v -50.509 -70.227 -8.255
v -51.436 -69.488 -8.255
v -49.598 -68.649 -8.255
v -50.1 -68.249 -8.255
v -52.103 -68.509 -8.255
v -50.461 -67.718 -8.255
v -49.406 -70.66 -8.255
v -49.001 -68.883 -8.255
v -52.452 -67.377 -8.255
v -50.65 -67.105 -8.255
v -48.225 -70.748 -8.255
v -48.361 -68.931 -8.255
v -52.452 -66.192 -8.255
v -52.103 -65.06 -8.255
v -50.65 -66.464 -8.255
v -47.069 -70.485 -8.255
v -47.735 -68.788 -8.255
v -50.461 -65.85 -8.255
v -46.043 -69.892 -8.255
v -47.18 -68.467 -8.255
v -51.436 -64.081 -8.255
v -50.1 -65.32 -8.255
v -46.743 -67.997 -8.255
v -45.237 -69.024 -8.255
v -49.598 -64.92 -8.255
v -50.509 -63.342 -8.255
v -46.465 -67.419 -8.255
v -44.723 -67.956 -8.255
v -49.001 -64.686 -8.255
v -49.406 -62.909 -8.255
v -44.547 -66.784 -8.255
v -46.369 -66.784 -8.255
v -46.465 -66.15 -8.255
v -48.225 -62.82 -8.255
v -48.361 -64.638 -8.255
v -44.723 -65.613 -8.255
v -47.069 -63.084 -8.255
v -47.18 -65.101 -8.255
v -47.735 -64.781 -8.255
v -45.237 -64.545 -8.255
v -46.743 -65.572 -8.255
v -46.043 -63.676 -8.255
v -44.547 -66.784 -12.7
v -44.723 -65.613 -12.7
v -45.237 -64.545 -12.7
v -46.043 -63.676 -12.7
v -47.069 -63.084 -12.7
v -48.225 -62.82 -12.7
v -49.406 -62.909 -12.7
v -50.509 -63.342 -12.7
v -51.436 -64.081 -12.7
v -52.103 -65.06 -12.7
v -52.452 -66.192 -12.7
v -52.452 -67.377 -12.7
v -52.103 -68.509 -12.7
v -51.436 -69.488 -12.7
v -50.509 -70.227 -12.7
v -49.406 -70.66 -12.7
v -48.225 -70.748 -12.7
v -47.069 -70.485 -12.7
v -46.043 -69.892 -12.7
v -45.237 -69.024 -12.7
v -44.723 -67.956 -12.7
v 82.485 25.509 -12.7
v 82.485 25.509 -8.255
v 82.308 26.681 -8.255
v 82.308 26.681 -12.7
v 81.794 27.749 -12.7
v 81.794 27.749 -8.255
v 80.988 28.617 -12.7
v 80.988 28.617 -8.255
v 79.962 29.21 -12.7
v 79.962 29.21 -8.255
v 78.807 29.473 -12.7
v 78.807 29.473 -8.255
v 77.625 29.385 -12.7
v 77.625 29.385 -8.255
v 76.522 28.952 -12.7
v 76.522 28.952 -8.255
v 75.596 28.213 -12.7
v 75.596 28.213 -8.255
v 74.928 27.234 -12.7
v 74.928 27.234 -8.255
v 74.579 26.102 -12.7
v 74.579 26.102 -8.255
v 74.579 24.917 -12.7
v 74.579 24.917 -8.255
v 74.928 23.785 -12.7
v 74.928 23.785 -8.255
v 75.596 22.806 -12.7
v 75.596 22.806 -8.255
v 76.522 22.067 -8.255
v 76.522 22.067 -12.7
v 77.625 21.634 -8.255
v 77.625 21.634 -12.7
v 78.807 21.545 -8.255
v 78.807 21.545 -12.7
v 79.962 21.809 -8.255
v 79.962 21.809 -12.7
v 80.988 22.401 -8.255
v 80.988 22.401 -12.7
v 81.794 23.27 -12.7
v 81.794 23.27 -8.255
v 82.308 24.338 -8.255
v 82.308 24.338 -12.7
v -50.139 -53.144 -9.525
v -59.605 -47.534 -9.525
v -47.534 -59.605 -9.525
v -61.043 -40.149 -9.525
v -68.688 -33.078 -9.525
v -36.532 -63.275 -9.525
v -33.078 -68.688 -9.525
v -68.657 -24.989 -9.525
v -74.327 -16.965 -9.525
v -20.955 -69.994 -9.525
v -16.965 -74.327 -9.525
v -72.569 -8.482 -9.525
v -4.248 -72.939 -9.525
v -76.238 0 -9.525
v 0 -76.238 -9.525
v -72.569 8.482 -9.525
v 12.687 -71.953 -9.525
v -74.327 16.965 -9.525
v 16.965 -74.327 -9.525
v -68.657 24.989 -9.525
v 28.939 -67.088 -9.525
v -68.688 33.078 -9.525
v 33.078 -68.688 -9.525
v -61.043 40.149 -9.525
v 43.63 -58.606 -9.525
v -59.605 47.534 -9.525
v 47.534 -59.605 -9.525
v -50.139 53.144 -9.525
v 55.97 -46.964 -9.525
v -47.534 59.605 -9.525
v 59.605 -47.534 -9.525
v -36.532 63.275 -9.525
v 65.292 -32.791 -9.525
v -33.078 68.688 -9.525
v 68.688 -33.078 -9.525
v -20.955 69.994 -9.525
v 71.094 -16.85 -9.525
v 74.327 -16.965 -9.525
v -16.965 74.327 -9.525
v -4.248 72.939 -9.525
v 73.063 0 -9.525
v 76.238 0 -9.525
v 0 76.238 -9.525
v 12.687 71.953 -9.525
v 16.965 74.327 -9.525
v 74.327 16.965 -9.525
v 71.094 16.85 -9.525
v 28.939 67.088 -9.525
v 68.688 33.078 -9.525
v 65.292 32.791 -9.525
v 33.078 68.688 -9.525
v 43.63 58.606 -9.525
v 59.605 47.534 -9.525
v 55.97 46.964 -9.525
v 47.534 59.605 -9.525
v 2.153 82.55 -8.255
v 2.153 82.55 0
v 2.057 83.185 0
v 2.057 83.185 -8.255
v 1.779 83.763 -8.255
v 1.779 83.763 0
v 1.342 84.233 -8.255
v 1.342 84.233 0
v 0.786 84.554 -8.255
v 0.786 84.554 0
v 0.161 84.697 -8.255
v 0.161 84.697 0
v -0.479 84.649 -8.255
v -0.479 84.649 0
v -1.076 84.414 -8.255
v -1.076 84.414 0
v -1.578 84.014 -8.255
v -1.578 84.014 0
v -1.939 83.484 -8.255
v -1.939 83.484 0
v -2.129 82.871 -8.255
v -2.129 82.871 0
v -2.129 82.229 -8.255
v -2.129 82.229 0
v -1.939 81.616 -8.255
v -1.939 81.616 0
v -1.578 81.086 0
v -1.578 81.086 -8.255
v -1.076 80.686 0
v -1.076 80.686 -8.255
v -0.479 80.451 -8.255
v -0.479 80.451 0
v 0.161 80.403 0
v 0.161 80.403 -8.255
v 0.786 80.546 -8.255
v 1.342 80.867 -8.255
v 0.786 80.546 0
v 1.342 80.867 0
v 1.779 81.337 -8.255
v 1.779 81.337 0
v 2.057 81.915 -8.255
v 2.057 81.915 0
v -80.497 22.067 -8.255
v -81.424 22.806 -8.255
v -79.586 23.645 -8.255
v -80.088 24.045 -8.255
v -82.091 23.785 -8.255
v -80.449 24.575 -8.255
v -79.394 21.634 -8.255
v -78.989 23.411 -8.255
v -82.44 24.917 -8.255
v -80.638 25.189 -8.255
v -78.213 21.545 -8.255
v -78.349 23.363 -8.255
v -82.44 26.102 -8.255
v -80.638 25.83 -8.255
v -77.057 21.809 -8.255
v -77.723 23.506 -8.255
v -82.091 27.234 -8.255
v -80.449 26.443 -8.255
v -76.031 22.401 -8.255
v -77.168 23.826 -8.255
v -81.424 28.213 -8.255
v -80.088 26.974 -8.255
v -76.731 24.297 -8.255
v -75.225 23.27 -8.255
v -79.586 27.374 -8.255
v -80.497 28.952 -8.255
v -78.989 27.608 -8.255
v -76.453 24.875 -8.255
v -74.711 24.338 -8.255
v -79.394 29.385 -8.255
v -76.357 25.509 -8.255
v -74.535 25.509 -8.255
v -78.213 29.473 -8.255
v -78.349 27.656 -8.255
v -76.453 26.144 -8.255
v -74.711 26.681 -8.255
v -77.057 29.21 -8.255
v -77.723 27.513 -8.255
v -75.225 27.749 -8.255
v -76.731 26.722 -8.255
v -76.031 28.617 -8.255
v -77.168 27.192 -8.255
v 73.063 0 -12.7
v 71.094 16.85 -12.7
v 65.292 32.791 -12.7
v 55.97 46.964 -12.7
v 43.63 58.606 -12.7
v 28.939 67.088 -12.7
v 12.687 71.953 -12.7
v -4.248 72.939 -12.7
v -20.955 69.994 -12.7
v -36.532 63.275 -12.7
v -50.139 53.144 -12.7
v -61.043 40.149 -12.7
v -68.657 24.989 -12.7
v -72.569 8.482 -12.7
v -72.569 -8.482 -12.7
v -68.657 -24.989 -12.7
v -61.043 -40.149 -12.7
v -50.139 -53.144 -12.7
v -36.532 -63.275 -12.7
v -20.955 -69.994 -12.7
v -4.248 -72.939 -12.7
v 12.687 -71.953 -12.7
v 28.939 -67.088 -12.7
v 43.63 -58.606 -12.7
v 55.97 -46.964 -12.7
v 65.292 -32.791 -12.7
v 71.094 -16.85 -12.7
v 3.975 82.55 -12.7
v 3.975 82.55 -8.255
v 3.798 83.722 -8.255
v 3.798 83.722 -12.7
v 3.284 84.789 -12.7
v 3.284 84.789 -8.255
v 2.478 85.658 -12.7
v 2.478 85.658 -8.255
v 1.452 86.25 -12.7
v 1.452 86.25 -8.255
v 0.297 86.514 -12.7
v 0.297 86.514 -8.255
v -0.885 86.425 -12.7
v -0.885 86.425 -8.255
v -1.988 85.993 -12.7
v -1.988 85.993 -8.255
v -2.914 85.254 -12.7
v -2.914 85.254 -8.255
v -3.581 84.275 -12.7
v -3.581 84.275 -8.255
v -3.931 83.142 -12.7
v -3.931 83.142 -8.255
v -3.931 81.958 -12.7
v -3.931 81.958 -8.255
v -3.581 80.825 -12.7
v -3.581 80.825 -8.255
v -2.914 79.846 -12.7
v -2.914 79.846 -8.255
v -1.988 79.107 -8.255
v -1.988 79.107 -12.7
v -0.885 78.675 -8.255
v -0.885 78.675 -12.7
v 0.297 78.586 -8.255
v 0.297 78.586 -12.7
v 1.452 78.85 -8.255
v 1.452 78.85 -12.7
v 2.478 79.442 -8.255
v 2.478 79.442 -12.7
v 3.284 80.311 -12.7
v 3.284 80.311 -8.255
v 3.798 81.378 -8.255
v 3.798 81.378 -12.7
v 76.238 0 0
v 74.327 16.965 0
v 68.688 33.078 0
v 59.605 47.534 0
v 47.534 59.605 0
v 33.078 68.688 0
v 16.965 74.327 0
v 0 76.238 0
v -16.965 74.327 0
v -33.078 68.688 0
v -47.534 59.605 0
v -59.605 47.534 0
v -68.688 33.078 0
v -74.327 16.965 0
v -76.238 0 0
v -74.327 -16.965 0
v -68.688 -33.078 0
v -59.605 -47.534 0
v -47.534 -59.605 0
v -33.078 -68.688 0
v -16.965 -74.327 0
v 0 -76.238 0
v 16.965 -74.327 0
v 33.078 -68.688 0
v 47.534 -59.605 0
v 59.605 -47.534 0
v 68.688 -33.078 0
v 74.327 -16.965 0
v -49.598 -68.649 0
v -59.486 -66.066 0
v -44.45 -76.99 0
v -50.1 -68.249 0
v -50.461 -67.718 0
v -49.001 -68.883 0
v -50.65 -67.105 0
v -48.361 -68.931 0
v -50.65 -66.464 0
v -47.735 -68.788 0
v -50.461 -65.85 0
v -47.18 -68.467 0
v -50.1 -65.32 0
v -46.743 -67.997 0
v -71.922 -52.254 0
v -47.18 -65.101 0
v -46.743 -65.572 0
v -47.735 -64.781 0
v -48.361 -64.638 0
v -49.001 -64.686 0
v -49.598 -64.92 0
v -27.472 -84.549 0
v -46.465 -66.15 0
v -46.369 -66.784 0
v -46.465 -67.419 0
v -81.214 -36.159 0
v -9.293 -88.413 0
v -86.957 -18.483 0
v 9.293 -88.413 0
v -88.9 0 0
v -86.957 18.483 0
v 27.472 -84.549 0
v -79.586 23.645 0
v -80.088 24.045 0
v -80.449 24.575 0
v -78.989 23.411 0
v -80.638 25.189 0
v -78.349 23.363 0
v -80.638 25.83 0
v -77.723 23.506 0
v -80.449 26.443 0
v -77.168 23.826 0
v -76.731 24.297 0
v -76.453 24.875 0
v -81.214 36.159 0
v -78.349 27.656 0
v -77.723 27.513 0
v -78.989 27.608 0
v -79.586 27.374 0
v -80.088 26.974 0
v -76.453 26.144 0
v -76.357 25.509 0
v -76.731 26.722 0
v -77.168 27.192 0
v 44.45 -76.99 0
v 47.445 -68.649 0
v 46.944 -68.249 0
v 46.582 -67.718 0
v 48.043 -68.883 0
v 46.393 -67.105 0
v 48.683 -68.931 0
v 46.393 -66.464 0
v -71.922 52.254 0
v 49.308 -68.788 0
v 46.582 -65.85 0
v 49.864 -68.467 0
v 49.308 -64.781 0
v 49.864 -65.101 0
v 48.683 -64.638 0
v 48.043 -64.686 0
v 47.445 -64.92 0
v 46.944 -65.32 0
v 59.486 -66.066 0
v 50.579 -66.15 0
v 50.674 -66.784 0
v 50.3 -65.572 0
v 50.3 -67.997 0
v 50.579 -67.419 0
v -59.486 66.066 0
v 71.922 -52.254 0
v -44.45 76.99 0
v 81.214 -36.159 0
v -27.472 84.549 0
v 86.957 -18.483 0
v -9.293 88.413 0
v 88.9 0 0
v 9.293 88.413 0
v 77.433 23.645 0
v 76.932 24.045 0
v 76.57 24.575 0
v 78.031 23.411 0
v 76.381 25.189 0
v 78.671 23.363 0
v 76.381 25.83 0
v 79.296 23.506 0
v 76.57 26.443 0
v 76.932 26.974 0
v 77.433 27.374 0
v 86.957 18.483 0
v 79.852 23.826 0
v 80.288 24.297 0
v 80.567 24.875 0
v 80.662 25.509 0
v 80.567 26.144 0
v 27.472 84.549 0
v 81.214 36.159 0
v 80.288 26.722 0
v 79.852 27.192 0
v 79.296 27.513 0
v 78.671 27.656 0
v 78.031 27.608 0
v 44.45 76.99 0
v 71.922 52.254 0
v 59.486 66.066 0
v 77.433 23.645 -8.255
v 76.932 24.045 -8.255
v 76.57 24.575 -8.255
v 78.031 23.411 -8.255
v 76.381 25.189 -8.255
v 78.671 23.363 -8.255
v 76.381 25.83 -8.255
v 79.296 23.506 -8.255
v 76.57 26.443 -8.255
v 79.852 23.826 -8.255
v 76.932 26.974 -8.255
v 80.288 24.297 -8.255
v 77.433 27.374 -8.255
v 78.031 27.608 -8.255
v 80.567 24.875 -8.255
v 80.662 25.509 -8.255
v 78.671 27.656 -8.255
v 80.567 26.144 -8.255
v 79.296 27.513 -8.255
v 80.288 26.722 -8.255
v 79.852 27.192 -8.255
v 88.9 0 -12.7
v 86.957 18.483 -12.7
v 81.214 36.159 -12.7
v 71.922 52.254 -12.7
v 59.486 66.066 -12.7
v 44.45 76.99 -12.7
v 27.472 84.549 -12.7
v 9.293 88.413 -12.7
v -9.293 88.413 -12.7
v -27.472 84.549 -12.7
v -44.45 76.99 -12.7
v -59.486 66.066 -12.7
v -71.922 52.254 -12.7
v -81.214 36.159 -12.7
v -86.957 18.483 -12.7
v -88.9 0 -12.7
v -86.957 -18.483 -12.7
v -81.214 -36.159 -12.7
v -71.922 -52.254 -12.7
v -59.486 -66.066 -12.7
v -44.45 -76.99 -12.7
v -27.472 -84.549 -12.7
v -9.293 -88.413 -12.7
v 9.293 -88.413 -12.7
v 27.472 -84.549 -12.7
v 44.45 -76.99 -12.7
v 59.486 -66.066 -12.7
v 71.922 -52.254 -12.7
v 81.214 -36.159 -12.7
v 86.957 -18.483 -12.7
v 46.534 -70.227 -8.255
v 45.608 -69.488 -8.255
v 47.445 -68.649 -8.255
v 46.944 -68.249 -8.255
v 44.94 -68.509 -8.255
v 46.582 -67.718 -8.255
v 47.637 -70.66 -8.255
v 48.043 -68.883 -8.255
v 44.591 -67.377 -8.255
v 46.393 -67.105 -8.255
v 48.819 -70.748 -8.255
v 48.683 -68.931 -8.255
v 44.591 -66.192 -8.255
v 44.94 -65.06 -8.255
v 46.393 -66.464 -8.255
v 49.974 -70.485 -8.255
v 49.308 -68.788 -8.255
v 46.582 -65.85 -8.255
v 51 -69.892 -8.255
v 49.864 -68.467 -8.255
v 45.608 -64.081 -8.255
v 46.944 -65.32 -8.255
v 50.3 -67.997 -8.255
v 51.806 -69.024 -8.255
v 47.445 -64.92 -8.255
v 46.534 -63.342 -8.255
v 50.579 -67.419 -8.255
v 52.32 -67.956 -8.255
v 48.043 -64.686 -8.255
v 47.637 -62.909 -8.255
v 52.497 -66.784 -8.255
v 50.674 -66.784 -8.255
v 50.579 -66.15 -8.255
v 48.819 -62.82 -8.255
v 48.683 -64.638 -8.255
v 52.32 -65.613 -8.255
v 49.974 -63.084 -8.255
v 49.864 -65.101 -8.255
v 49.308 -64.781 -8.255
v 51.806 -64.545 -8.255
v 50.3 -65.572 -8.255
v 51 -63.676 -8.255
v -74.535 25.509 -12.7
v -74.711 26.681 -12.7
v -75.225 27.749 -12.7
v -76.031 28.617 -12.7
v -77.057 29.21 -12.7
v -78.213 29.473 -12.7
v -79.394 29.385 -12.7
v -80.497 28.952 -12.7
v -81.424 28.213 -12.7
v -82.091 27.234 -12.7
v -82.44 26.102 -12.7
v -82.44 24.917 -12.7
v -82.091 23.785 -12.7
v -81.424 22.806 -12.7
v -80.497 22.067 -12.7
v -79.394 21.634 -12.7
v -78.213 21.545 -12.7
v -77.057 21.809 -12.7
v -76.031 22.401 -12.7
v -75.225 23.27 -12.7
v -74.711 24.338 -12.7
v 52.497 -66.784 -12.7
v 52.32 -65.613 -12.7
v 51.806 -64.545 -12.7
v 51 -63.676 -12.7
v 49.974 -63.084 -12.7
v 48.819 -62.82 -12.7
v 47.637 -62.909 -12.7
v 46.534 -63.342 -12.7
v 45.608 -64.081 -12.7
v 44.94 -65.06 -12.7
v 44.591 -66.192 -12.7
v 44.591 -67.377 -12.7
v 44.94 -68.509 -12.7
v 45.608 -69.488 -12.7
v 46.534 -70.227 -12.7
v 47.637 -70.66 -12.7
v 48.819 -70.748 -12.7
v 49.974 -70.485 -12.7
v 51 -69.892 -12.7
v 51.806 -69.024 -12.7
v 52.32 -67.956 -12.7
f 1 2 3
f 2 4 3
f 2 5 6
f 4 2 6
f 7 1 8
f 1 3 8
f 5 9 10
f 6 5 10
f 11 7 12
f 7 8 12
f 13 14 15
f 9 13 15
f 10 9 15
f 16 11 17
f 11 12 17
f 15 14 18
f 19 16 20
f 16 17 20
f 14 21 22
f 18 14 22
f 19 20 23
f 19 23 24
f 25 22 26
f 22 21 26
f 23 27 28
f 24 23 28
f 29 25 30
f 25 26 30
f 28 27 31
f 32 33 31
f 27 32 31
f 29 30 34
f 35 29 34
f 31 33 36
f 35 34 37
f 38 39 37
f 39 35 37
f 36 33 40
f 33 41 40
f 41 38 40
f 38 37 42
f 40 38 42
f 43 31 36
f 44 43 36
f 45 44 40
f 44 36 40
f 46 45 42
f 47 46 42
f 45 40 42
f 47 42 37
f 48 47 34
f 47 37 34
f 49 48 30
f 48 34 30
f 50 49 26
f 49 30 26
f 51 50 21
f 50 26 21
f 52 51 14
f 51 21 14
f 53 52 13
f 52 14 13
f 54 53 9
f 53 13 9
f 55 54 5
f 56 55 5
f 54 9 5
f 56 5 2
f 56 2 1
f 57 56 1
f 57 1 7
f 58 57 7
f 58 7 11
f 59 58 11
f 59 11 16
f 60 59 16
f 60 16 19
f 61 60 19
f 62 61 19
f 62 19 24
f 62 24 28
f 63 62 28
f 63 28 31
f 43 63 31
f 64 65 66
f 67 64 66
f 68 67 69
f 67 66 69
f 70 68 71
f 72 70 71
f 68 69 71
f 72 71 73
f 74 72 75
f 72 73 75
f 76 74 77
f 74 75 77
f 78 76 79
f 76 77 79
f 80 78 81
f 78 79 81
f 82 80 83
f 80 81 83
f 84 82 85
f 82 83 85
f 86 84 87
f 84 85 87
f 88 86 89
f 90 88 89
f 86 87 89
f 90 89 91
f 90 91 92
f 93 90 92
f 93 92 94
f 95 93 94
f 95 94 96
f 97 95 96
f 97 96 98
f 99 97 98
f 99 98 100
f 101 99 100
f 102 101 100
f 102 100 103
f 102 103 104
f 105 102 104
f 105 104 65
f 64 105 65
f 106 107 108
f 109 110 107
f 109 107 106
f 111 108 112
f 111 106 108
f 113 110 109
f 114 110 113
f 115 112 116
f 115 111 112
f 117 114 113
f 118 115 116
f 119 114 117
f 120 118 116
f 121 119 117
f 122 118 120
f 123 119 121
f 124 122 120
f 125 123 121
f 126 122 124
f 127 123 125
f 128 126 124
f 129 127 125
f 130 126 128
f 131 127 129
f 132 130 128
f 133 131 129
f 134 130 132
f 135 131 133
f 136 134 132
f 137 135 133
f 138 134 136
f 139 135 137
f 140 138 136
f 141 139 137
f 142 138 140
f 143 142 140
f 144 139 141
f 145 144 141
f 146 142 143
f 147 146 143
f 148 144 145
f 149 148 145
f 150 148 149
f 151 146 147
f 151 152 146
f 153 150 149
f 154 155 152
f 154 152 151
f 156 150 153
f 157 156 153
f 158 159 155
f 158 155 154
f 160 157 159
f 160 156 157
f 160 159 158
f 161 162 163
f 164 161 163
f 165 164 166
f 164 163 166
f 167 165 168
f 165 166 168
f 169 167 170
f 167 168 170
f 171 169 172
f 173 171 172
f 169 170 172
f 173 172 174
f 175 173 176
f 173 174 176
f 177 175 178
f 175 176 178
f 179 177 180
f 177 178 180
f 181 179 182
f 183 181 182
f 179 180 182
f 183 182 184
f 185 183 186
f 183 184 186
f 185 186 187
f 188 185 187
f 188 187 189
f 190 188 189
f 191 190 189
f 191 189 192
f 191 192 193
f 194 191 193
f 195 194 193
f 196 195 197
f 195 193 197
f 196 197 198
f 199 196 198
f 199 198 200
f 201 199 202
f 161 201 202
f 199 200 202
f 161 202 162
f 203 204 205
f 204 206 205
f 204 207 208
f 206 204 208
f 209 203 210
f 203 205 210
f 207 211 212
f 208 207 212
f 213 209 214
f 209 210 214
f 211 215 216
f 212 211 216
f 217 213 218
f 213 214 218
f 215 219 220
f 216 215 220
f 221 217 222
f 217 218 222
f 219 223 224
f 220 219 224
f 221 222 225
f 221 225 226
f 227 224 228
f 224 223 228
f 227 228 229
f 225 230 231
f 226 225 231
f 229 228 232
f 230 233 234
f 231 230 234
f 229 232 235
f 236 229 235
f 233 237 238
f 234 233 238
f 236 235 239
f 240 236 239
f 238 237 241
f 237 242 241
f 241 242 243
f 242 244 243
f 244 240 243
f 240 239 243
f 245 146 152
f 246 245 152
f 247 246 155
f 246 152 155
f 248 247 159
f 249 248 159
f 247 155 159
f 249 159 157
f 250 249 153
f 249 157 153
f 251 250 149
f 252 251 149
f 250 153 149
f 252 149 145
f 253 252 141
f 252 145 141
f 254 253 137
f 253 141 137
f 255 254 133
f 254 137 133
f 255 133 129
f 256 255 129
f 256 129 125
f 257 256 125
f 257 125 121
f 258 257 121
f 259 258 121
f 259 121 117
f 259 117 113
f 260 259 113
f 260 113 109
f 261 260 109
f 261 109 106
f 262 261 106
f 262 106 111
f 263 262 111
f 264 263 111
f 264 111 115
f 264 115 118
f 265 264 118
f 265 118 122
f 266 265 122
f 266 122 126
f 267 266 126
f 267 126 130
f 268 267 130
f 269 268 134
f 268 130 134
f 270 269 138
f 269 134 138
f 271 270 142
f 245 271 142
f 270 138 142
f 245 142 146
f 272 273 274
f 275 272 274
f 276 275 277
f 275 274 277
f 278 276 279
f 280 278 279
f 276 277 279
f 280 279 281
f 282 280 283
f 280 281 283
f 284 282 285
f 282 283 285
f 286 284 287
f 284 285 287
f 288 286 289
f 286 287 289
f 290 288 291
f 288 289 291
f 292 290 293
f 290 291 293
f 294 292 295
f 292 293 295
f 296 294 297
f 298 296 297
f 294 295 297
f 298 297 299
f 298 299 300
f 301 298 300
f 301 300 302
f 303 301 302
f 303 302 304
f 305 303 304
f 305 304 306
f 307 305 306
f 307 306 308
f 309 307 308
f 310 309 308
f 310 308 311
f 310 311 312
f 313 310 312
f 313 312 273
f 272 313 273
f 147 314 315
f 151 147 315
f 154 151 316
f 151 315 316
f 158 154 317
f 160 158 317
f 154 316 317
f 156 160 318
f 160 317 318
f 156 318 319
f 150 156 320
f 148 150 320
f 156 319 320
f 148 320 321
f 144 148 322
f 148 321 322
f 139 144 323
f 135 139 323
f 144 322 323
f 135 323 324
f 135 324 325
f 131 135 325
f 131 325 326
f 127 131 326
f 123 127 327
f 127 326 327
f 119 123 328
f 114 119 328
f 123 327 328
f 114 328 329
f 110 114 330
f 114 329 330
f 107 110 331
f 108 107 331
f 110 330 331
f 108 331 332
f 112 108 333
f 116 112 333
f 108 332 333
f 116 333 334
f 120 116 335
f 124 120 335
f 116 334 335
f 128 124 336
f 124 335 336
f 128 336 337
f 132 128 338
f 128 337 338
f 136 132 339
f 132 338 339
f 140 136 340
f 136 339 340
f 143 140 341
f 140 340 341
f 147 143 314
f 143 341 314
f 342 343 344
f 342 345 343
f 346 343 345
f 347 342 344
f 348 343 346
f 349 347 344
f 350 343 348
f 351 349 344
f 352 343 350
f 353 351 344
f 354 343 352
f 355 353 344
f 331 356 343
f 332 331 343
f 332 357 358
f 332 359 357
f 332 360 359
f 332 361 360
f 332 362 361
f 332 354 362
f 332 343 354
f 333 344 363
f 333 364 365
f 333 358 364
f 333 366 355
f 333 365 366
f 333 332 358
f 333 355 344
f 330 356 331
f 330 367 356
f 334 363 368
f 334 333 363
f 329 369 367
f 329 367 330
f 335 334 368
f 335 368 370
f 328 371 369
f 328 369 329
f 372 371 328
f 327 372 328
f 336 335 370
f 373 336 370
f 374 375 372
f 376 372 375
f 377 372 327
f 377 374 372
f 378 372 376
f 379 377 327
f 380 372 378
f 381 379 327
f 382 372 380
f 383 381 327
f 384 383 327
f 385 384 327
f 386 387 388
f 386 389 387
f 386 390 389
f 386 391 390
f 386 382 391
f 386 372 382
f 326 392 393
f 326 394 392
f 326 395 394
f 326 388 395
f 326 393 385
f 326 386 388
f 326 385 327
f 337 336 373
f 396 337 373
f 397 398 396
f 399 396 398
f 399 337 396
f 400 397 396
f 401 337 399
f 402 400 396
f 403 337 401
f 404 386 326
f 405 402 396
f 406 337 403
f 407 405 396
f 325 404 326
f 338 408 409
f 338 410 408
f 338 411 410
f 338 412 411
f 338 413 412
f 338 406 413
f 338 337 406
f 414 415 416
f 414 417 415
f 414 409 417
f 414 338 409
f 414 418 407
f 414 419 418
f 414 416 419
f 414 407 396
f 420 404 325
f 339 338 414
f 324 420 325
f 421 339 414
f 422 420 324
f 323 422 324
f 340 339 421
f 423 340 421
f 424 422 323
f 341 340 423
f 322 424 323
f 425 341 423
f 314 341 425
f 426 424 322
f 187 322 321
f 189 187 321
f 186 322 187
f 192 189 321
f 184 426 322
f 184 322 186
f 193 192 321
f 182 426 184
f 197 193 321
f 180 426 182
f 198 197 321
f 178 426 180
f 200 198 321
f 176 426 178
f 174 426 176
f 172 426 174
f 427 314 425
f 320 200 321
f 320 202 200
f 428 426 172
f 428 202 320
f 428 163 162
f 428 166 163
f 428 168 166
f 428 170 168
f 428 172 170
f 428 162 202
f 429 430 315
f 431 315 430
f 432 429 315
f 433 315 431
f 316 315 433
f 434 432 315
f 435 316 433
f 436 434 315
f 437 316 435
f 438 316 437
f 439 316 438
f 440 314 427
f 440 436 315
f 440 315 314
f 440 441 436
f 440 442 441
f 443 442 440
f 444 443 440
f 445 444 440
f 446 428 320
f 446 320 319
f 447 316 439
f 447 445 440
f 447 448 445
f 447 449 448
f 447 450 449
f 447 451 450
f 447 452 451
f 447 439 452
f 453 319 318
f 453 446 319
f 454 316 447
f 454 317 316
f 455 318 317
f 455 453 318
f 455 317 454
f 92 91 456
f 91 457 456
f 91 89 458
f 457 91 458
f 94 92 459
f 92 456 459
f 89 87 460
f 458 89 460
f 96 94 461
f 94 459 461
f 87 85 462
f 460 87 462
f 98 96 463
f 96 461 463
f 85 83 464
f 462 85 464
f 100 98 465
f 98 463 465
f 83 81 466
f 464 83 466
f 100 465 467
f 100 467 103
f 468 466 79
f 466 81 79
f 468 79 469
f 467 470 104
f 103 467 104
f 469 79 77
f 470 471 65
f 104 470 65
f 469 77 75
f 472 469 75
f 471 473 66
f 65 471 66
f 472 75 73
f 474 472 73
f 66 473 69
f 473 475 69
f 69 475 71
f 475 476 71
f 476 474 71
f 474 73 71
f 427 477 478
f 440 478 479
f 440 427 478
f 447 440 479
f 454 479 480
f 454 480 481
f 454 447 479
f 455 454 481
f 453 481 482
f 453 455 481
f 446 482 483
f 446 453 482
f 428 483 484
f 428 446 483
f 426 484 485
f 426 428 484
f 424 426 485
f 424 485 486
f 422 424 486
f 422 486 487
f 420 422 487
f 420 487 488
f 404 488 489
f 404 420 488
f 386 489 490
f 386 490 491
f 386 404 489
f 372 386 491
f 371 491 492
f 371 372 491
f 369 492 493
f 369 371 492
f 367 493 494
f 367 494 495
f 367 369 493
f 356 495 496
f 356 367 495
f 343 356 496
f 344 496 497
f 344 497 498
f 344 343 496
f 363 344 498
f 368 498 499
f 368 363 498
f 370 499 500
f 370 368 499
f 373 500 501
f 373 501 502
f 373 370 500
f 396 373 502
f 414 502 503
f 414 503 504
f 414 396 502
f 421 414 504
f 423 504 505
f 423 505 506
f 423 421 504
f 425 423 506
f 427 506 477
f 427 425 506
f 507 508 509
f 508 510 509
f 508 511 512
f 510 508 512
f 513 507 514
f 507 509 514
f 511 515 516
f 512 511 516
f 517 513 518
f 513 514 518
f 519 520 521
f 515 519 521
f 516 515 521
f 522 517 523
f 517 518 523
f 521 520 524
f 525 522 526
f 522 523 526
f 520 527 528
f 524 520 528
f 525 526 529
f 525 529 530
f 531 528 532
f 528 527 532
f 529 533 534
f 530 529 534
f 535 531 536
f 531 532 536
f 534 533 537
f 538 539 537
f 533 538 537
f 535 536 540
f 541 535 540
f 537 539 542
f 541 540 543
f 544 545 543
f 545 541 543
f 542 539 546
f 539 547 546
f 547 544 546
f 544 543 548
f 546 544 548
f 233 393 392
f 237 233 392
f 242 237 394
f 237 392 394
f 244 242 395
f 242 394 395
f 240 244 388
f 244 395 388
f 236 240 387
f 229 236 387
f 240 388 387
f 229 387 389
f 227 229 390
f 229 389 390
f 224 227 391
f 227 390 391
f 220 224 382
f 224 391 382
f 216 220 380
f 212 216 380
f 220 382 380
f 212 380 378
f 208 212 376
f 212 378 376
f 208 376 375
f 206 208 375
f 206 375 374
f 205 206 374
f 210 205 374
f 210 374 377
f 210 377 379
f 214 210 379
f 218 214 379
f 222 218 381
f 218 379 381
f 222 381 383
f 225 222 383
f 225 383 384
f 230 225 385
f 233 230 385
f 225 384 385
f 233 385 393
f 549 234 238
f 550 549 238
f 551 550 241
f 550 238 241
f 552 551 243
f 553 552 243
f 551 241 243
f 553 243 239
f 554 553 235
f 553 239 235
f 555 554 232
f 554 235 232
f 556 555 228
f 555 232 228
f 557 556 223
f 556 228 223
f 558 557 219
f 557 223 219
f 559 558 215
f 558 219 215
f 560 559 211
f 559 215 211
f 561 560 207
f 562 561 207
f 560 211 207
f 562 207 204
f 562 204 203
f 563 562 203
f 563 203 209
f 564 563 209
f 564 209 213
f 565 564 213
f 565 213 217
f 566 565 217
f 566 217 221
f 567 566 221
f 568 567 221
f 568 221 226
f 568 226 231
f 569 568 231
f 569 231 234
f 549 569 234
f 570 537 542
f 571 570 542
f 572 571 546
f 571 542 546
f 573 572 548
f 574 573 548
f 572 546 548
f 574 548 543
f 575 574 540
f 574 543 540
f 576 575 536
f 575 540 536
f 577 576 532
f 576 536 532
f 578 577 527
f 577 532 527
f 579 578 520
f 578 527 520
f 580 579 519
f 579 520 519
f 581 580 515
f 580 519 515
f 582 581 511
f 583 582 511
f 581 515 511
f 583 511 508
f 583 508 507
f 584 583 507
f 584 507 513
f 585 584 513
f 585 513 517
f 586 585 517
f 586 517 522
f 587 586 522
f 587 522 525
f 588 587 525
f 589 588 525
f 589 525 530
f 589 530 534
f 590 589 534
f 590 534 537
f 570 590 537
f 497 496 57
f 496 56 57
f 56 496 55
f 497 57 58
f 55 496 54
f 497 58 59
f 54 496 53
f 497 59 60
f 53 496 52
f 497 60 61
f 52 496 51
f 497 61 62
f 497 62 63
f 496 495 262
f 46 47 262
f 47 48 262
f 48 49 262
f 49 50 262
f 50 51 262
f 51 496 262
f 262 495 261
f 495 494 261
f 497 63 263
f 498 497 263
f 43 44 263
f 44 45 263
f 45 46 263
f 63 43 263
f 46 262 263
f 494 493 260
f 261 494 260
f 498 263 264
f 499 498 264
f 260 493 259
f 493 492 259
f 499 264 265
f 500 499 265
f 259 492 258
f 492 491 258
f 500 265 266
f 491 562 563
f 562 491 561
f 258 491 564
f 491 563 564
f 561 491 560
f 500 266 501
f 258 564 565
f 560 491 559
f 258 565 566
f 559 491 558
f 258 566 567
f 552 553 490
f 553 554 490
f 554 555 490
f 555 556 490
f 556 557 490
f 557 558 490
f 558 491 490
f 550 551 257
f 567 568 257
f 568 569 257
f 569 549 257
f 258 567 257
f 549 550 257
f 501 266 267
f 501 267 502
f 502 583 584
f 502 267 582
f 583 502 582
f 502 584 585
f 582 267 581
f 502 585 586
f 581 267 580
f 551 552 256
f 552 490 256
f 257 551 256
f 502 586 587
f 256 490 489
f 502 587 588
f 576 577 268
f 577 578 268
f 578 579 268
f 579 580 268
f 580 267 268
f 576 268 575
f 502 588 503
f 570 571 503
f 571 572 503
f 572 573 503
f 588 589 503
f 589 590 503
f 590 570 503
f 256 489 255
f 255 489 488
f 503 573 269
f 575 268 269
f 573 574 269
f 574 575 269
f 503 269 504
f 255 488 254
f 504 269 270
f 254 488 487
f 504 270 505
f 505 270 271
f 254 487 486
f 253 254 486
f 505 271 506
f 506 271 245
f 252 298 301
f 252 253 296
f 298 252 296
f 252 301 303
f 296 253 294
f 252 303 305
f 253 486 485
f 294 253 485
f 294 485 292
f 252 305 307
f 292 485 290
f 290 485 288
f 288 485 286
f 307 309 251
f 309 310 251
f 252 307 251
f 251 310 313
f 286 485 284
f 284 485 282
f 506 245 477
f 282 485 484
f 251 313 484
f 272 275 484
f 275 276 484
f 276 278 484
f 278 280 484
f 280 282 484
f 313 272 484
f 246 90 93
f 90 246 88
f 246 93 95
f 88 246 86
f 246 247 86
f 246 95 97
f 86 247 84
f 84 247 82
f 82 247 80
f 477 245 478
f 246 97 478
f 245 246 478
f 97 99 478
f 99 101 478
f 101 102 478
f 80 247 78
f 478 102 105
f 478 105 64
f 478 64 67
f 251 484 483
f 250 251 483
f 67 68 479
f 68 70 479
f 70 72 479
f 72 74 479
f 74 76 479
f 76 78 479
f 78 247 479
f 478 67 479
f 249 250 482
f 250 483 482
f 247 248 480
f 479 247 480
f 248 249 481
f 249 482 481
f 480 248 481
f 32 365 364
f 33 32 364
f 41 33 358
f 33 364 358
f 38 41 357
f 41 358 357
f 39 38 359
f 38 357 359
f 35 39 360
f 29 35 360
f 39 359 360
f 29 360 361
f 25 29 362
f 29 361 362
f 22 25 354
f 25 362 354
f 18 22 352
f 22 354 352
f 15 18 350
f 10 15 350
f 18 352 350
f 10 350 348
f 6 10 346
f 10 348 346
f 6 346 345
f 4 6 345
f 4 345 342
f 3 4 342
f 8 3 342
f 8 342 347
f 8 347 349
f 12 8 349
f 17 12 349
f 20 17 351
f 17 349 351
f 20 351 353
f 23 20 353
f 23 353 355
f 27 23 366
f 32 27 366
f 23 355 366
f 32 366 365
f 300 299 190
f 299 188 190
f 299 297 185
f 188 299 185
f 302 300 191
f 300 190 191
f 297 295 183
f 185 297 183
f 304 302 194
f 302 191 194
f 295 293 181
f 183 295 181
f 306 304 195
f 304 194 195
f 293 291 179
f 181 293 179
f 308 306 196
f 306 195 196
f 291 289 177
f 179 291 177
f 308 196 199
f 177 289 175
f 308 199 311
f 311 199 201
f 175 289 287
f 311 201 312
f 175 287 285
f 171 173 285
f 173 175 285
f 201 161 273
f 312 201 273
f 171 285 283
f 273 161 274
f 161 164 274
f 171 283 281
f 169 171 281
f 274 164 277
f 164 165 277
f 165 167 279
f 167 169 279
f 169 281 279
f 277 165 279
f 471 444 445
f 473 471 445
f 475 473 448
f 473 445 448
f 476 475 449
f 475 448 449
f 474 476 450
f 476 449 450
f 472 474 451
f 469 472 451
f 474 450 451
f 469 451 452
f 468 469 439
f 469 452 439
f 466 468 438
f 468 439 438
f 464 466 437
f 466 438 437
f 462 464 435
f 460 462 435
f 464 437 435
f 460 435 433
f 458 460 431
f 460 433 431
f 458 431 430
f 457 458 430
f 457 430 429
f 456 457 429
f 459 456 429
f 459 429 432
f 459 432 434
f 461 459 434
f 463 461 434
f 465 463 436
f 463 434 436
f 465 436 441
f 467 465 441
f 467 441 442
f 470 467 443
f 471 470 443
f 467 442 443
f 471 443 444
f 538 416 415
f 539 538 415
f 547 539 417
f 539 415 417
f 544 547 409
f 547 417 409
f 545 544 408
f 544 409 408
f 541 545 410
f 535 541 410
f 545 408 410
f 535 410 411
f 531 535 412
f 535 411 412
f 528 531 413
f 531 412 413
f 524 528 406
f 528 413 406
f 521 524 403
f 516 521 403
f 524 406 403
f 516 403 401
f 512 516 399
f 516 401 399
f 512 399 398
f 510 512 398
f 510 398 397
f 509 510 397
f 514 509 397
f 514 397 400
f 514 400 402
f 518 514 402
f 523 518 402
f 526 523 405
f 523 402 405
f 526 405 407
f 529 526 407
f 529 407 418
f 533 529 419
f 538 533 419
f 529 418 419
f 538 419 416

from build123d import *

# Parameters (mm, degrees)
F0_R     = 88.9
F0_R_2   = 3.9751
F0_R_3   = 76.2381
F0_R_4   = 73.0631
F1_DEPTH = 12.7
F2_DEPTH = 9.525
F0_R_5   = 2.15265
F3_DEPTH = 8.255


with BuildPart() as f1:
    # F0 (on Top) → F1 (new body)
    with BuildSketch(Plane.XY):
        Circle(F0_R)
        with Locations((-48.521673, -66.784353)):
            Circle(F0_R_2, mode=Mode.SUBTRACT)
        with Locations((48.521673, -66.784353)):
            Circle(F0_R_2, mode=Mode.SUBTRACT)
        with Locations((-78.509715, 25.509353)):
            Circle(F0_R_2, mode=Mode.SUBTRACT)
        Circle(F0_R_3, mode=Mode.SUBTRACT)
        with Locations((78.509715, 25.509353)):
            Circle(F0_R_2, mode=Mode.SUBTRACT)
        with Locations((0, 82.55)):
            Circle(F0_R_2, mode=Mode.SUBTRACT)
        Circle(F0_R_3)
        Circle(F0_R_4, mode=Mode.SUBTRACT)
    extrude(amount=-F1_DEPTH)

    # F0 (on Top) → F2 (cut)
    with BuildSketch(Plane.XY):
        Circle(F0_R_3)
        Circle(F0_R_4, mode=Mode.SUBTRACT)
    extrude(amount=-F2_DEPTH, mode=Mode.SUBTRACT)

    # F0 (on Top) → F3 (join)
    with BuildSketch(Plane.XY):
        with Locations((-48.521673, -66.784353)):
            Circle(F0_R_2)
        with Locations((-48.521673, -66.784353)):
            Circle(F0_R_5, mode=Mode.SUBTRACT)
        with Locations((48.521673, -66.784353)):
            Circle(F0_R_2)
        with Locations((48.521673, -66.784353)):
            Circle(F0_R_5, mode=Mode.SUBTRACT)
        with Locations((78.509715, 25.509353)):
            Circle(F0_R_2)
        with Locations((78.509715, 25.509353)):
            Circle(F0_R_5, mode=Mode.SUBTRACT)
        with Locations((0, 82.55)):
            Circle(F0_R_2)
        with Locations((0, 82.55)):
            Circle(F0_R_5, mode=Mode.SUBTRACT)
        with Locations((-78.509715, 25.509353)):
            Circle(F0_R_2)
        with Locations((-78.509715, 25.509353)):
            Circle(F0_R_5, mode=Mode.SUBTRACT)
    extrude(amount=-F3_DEPTH)


solid = f1.part
